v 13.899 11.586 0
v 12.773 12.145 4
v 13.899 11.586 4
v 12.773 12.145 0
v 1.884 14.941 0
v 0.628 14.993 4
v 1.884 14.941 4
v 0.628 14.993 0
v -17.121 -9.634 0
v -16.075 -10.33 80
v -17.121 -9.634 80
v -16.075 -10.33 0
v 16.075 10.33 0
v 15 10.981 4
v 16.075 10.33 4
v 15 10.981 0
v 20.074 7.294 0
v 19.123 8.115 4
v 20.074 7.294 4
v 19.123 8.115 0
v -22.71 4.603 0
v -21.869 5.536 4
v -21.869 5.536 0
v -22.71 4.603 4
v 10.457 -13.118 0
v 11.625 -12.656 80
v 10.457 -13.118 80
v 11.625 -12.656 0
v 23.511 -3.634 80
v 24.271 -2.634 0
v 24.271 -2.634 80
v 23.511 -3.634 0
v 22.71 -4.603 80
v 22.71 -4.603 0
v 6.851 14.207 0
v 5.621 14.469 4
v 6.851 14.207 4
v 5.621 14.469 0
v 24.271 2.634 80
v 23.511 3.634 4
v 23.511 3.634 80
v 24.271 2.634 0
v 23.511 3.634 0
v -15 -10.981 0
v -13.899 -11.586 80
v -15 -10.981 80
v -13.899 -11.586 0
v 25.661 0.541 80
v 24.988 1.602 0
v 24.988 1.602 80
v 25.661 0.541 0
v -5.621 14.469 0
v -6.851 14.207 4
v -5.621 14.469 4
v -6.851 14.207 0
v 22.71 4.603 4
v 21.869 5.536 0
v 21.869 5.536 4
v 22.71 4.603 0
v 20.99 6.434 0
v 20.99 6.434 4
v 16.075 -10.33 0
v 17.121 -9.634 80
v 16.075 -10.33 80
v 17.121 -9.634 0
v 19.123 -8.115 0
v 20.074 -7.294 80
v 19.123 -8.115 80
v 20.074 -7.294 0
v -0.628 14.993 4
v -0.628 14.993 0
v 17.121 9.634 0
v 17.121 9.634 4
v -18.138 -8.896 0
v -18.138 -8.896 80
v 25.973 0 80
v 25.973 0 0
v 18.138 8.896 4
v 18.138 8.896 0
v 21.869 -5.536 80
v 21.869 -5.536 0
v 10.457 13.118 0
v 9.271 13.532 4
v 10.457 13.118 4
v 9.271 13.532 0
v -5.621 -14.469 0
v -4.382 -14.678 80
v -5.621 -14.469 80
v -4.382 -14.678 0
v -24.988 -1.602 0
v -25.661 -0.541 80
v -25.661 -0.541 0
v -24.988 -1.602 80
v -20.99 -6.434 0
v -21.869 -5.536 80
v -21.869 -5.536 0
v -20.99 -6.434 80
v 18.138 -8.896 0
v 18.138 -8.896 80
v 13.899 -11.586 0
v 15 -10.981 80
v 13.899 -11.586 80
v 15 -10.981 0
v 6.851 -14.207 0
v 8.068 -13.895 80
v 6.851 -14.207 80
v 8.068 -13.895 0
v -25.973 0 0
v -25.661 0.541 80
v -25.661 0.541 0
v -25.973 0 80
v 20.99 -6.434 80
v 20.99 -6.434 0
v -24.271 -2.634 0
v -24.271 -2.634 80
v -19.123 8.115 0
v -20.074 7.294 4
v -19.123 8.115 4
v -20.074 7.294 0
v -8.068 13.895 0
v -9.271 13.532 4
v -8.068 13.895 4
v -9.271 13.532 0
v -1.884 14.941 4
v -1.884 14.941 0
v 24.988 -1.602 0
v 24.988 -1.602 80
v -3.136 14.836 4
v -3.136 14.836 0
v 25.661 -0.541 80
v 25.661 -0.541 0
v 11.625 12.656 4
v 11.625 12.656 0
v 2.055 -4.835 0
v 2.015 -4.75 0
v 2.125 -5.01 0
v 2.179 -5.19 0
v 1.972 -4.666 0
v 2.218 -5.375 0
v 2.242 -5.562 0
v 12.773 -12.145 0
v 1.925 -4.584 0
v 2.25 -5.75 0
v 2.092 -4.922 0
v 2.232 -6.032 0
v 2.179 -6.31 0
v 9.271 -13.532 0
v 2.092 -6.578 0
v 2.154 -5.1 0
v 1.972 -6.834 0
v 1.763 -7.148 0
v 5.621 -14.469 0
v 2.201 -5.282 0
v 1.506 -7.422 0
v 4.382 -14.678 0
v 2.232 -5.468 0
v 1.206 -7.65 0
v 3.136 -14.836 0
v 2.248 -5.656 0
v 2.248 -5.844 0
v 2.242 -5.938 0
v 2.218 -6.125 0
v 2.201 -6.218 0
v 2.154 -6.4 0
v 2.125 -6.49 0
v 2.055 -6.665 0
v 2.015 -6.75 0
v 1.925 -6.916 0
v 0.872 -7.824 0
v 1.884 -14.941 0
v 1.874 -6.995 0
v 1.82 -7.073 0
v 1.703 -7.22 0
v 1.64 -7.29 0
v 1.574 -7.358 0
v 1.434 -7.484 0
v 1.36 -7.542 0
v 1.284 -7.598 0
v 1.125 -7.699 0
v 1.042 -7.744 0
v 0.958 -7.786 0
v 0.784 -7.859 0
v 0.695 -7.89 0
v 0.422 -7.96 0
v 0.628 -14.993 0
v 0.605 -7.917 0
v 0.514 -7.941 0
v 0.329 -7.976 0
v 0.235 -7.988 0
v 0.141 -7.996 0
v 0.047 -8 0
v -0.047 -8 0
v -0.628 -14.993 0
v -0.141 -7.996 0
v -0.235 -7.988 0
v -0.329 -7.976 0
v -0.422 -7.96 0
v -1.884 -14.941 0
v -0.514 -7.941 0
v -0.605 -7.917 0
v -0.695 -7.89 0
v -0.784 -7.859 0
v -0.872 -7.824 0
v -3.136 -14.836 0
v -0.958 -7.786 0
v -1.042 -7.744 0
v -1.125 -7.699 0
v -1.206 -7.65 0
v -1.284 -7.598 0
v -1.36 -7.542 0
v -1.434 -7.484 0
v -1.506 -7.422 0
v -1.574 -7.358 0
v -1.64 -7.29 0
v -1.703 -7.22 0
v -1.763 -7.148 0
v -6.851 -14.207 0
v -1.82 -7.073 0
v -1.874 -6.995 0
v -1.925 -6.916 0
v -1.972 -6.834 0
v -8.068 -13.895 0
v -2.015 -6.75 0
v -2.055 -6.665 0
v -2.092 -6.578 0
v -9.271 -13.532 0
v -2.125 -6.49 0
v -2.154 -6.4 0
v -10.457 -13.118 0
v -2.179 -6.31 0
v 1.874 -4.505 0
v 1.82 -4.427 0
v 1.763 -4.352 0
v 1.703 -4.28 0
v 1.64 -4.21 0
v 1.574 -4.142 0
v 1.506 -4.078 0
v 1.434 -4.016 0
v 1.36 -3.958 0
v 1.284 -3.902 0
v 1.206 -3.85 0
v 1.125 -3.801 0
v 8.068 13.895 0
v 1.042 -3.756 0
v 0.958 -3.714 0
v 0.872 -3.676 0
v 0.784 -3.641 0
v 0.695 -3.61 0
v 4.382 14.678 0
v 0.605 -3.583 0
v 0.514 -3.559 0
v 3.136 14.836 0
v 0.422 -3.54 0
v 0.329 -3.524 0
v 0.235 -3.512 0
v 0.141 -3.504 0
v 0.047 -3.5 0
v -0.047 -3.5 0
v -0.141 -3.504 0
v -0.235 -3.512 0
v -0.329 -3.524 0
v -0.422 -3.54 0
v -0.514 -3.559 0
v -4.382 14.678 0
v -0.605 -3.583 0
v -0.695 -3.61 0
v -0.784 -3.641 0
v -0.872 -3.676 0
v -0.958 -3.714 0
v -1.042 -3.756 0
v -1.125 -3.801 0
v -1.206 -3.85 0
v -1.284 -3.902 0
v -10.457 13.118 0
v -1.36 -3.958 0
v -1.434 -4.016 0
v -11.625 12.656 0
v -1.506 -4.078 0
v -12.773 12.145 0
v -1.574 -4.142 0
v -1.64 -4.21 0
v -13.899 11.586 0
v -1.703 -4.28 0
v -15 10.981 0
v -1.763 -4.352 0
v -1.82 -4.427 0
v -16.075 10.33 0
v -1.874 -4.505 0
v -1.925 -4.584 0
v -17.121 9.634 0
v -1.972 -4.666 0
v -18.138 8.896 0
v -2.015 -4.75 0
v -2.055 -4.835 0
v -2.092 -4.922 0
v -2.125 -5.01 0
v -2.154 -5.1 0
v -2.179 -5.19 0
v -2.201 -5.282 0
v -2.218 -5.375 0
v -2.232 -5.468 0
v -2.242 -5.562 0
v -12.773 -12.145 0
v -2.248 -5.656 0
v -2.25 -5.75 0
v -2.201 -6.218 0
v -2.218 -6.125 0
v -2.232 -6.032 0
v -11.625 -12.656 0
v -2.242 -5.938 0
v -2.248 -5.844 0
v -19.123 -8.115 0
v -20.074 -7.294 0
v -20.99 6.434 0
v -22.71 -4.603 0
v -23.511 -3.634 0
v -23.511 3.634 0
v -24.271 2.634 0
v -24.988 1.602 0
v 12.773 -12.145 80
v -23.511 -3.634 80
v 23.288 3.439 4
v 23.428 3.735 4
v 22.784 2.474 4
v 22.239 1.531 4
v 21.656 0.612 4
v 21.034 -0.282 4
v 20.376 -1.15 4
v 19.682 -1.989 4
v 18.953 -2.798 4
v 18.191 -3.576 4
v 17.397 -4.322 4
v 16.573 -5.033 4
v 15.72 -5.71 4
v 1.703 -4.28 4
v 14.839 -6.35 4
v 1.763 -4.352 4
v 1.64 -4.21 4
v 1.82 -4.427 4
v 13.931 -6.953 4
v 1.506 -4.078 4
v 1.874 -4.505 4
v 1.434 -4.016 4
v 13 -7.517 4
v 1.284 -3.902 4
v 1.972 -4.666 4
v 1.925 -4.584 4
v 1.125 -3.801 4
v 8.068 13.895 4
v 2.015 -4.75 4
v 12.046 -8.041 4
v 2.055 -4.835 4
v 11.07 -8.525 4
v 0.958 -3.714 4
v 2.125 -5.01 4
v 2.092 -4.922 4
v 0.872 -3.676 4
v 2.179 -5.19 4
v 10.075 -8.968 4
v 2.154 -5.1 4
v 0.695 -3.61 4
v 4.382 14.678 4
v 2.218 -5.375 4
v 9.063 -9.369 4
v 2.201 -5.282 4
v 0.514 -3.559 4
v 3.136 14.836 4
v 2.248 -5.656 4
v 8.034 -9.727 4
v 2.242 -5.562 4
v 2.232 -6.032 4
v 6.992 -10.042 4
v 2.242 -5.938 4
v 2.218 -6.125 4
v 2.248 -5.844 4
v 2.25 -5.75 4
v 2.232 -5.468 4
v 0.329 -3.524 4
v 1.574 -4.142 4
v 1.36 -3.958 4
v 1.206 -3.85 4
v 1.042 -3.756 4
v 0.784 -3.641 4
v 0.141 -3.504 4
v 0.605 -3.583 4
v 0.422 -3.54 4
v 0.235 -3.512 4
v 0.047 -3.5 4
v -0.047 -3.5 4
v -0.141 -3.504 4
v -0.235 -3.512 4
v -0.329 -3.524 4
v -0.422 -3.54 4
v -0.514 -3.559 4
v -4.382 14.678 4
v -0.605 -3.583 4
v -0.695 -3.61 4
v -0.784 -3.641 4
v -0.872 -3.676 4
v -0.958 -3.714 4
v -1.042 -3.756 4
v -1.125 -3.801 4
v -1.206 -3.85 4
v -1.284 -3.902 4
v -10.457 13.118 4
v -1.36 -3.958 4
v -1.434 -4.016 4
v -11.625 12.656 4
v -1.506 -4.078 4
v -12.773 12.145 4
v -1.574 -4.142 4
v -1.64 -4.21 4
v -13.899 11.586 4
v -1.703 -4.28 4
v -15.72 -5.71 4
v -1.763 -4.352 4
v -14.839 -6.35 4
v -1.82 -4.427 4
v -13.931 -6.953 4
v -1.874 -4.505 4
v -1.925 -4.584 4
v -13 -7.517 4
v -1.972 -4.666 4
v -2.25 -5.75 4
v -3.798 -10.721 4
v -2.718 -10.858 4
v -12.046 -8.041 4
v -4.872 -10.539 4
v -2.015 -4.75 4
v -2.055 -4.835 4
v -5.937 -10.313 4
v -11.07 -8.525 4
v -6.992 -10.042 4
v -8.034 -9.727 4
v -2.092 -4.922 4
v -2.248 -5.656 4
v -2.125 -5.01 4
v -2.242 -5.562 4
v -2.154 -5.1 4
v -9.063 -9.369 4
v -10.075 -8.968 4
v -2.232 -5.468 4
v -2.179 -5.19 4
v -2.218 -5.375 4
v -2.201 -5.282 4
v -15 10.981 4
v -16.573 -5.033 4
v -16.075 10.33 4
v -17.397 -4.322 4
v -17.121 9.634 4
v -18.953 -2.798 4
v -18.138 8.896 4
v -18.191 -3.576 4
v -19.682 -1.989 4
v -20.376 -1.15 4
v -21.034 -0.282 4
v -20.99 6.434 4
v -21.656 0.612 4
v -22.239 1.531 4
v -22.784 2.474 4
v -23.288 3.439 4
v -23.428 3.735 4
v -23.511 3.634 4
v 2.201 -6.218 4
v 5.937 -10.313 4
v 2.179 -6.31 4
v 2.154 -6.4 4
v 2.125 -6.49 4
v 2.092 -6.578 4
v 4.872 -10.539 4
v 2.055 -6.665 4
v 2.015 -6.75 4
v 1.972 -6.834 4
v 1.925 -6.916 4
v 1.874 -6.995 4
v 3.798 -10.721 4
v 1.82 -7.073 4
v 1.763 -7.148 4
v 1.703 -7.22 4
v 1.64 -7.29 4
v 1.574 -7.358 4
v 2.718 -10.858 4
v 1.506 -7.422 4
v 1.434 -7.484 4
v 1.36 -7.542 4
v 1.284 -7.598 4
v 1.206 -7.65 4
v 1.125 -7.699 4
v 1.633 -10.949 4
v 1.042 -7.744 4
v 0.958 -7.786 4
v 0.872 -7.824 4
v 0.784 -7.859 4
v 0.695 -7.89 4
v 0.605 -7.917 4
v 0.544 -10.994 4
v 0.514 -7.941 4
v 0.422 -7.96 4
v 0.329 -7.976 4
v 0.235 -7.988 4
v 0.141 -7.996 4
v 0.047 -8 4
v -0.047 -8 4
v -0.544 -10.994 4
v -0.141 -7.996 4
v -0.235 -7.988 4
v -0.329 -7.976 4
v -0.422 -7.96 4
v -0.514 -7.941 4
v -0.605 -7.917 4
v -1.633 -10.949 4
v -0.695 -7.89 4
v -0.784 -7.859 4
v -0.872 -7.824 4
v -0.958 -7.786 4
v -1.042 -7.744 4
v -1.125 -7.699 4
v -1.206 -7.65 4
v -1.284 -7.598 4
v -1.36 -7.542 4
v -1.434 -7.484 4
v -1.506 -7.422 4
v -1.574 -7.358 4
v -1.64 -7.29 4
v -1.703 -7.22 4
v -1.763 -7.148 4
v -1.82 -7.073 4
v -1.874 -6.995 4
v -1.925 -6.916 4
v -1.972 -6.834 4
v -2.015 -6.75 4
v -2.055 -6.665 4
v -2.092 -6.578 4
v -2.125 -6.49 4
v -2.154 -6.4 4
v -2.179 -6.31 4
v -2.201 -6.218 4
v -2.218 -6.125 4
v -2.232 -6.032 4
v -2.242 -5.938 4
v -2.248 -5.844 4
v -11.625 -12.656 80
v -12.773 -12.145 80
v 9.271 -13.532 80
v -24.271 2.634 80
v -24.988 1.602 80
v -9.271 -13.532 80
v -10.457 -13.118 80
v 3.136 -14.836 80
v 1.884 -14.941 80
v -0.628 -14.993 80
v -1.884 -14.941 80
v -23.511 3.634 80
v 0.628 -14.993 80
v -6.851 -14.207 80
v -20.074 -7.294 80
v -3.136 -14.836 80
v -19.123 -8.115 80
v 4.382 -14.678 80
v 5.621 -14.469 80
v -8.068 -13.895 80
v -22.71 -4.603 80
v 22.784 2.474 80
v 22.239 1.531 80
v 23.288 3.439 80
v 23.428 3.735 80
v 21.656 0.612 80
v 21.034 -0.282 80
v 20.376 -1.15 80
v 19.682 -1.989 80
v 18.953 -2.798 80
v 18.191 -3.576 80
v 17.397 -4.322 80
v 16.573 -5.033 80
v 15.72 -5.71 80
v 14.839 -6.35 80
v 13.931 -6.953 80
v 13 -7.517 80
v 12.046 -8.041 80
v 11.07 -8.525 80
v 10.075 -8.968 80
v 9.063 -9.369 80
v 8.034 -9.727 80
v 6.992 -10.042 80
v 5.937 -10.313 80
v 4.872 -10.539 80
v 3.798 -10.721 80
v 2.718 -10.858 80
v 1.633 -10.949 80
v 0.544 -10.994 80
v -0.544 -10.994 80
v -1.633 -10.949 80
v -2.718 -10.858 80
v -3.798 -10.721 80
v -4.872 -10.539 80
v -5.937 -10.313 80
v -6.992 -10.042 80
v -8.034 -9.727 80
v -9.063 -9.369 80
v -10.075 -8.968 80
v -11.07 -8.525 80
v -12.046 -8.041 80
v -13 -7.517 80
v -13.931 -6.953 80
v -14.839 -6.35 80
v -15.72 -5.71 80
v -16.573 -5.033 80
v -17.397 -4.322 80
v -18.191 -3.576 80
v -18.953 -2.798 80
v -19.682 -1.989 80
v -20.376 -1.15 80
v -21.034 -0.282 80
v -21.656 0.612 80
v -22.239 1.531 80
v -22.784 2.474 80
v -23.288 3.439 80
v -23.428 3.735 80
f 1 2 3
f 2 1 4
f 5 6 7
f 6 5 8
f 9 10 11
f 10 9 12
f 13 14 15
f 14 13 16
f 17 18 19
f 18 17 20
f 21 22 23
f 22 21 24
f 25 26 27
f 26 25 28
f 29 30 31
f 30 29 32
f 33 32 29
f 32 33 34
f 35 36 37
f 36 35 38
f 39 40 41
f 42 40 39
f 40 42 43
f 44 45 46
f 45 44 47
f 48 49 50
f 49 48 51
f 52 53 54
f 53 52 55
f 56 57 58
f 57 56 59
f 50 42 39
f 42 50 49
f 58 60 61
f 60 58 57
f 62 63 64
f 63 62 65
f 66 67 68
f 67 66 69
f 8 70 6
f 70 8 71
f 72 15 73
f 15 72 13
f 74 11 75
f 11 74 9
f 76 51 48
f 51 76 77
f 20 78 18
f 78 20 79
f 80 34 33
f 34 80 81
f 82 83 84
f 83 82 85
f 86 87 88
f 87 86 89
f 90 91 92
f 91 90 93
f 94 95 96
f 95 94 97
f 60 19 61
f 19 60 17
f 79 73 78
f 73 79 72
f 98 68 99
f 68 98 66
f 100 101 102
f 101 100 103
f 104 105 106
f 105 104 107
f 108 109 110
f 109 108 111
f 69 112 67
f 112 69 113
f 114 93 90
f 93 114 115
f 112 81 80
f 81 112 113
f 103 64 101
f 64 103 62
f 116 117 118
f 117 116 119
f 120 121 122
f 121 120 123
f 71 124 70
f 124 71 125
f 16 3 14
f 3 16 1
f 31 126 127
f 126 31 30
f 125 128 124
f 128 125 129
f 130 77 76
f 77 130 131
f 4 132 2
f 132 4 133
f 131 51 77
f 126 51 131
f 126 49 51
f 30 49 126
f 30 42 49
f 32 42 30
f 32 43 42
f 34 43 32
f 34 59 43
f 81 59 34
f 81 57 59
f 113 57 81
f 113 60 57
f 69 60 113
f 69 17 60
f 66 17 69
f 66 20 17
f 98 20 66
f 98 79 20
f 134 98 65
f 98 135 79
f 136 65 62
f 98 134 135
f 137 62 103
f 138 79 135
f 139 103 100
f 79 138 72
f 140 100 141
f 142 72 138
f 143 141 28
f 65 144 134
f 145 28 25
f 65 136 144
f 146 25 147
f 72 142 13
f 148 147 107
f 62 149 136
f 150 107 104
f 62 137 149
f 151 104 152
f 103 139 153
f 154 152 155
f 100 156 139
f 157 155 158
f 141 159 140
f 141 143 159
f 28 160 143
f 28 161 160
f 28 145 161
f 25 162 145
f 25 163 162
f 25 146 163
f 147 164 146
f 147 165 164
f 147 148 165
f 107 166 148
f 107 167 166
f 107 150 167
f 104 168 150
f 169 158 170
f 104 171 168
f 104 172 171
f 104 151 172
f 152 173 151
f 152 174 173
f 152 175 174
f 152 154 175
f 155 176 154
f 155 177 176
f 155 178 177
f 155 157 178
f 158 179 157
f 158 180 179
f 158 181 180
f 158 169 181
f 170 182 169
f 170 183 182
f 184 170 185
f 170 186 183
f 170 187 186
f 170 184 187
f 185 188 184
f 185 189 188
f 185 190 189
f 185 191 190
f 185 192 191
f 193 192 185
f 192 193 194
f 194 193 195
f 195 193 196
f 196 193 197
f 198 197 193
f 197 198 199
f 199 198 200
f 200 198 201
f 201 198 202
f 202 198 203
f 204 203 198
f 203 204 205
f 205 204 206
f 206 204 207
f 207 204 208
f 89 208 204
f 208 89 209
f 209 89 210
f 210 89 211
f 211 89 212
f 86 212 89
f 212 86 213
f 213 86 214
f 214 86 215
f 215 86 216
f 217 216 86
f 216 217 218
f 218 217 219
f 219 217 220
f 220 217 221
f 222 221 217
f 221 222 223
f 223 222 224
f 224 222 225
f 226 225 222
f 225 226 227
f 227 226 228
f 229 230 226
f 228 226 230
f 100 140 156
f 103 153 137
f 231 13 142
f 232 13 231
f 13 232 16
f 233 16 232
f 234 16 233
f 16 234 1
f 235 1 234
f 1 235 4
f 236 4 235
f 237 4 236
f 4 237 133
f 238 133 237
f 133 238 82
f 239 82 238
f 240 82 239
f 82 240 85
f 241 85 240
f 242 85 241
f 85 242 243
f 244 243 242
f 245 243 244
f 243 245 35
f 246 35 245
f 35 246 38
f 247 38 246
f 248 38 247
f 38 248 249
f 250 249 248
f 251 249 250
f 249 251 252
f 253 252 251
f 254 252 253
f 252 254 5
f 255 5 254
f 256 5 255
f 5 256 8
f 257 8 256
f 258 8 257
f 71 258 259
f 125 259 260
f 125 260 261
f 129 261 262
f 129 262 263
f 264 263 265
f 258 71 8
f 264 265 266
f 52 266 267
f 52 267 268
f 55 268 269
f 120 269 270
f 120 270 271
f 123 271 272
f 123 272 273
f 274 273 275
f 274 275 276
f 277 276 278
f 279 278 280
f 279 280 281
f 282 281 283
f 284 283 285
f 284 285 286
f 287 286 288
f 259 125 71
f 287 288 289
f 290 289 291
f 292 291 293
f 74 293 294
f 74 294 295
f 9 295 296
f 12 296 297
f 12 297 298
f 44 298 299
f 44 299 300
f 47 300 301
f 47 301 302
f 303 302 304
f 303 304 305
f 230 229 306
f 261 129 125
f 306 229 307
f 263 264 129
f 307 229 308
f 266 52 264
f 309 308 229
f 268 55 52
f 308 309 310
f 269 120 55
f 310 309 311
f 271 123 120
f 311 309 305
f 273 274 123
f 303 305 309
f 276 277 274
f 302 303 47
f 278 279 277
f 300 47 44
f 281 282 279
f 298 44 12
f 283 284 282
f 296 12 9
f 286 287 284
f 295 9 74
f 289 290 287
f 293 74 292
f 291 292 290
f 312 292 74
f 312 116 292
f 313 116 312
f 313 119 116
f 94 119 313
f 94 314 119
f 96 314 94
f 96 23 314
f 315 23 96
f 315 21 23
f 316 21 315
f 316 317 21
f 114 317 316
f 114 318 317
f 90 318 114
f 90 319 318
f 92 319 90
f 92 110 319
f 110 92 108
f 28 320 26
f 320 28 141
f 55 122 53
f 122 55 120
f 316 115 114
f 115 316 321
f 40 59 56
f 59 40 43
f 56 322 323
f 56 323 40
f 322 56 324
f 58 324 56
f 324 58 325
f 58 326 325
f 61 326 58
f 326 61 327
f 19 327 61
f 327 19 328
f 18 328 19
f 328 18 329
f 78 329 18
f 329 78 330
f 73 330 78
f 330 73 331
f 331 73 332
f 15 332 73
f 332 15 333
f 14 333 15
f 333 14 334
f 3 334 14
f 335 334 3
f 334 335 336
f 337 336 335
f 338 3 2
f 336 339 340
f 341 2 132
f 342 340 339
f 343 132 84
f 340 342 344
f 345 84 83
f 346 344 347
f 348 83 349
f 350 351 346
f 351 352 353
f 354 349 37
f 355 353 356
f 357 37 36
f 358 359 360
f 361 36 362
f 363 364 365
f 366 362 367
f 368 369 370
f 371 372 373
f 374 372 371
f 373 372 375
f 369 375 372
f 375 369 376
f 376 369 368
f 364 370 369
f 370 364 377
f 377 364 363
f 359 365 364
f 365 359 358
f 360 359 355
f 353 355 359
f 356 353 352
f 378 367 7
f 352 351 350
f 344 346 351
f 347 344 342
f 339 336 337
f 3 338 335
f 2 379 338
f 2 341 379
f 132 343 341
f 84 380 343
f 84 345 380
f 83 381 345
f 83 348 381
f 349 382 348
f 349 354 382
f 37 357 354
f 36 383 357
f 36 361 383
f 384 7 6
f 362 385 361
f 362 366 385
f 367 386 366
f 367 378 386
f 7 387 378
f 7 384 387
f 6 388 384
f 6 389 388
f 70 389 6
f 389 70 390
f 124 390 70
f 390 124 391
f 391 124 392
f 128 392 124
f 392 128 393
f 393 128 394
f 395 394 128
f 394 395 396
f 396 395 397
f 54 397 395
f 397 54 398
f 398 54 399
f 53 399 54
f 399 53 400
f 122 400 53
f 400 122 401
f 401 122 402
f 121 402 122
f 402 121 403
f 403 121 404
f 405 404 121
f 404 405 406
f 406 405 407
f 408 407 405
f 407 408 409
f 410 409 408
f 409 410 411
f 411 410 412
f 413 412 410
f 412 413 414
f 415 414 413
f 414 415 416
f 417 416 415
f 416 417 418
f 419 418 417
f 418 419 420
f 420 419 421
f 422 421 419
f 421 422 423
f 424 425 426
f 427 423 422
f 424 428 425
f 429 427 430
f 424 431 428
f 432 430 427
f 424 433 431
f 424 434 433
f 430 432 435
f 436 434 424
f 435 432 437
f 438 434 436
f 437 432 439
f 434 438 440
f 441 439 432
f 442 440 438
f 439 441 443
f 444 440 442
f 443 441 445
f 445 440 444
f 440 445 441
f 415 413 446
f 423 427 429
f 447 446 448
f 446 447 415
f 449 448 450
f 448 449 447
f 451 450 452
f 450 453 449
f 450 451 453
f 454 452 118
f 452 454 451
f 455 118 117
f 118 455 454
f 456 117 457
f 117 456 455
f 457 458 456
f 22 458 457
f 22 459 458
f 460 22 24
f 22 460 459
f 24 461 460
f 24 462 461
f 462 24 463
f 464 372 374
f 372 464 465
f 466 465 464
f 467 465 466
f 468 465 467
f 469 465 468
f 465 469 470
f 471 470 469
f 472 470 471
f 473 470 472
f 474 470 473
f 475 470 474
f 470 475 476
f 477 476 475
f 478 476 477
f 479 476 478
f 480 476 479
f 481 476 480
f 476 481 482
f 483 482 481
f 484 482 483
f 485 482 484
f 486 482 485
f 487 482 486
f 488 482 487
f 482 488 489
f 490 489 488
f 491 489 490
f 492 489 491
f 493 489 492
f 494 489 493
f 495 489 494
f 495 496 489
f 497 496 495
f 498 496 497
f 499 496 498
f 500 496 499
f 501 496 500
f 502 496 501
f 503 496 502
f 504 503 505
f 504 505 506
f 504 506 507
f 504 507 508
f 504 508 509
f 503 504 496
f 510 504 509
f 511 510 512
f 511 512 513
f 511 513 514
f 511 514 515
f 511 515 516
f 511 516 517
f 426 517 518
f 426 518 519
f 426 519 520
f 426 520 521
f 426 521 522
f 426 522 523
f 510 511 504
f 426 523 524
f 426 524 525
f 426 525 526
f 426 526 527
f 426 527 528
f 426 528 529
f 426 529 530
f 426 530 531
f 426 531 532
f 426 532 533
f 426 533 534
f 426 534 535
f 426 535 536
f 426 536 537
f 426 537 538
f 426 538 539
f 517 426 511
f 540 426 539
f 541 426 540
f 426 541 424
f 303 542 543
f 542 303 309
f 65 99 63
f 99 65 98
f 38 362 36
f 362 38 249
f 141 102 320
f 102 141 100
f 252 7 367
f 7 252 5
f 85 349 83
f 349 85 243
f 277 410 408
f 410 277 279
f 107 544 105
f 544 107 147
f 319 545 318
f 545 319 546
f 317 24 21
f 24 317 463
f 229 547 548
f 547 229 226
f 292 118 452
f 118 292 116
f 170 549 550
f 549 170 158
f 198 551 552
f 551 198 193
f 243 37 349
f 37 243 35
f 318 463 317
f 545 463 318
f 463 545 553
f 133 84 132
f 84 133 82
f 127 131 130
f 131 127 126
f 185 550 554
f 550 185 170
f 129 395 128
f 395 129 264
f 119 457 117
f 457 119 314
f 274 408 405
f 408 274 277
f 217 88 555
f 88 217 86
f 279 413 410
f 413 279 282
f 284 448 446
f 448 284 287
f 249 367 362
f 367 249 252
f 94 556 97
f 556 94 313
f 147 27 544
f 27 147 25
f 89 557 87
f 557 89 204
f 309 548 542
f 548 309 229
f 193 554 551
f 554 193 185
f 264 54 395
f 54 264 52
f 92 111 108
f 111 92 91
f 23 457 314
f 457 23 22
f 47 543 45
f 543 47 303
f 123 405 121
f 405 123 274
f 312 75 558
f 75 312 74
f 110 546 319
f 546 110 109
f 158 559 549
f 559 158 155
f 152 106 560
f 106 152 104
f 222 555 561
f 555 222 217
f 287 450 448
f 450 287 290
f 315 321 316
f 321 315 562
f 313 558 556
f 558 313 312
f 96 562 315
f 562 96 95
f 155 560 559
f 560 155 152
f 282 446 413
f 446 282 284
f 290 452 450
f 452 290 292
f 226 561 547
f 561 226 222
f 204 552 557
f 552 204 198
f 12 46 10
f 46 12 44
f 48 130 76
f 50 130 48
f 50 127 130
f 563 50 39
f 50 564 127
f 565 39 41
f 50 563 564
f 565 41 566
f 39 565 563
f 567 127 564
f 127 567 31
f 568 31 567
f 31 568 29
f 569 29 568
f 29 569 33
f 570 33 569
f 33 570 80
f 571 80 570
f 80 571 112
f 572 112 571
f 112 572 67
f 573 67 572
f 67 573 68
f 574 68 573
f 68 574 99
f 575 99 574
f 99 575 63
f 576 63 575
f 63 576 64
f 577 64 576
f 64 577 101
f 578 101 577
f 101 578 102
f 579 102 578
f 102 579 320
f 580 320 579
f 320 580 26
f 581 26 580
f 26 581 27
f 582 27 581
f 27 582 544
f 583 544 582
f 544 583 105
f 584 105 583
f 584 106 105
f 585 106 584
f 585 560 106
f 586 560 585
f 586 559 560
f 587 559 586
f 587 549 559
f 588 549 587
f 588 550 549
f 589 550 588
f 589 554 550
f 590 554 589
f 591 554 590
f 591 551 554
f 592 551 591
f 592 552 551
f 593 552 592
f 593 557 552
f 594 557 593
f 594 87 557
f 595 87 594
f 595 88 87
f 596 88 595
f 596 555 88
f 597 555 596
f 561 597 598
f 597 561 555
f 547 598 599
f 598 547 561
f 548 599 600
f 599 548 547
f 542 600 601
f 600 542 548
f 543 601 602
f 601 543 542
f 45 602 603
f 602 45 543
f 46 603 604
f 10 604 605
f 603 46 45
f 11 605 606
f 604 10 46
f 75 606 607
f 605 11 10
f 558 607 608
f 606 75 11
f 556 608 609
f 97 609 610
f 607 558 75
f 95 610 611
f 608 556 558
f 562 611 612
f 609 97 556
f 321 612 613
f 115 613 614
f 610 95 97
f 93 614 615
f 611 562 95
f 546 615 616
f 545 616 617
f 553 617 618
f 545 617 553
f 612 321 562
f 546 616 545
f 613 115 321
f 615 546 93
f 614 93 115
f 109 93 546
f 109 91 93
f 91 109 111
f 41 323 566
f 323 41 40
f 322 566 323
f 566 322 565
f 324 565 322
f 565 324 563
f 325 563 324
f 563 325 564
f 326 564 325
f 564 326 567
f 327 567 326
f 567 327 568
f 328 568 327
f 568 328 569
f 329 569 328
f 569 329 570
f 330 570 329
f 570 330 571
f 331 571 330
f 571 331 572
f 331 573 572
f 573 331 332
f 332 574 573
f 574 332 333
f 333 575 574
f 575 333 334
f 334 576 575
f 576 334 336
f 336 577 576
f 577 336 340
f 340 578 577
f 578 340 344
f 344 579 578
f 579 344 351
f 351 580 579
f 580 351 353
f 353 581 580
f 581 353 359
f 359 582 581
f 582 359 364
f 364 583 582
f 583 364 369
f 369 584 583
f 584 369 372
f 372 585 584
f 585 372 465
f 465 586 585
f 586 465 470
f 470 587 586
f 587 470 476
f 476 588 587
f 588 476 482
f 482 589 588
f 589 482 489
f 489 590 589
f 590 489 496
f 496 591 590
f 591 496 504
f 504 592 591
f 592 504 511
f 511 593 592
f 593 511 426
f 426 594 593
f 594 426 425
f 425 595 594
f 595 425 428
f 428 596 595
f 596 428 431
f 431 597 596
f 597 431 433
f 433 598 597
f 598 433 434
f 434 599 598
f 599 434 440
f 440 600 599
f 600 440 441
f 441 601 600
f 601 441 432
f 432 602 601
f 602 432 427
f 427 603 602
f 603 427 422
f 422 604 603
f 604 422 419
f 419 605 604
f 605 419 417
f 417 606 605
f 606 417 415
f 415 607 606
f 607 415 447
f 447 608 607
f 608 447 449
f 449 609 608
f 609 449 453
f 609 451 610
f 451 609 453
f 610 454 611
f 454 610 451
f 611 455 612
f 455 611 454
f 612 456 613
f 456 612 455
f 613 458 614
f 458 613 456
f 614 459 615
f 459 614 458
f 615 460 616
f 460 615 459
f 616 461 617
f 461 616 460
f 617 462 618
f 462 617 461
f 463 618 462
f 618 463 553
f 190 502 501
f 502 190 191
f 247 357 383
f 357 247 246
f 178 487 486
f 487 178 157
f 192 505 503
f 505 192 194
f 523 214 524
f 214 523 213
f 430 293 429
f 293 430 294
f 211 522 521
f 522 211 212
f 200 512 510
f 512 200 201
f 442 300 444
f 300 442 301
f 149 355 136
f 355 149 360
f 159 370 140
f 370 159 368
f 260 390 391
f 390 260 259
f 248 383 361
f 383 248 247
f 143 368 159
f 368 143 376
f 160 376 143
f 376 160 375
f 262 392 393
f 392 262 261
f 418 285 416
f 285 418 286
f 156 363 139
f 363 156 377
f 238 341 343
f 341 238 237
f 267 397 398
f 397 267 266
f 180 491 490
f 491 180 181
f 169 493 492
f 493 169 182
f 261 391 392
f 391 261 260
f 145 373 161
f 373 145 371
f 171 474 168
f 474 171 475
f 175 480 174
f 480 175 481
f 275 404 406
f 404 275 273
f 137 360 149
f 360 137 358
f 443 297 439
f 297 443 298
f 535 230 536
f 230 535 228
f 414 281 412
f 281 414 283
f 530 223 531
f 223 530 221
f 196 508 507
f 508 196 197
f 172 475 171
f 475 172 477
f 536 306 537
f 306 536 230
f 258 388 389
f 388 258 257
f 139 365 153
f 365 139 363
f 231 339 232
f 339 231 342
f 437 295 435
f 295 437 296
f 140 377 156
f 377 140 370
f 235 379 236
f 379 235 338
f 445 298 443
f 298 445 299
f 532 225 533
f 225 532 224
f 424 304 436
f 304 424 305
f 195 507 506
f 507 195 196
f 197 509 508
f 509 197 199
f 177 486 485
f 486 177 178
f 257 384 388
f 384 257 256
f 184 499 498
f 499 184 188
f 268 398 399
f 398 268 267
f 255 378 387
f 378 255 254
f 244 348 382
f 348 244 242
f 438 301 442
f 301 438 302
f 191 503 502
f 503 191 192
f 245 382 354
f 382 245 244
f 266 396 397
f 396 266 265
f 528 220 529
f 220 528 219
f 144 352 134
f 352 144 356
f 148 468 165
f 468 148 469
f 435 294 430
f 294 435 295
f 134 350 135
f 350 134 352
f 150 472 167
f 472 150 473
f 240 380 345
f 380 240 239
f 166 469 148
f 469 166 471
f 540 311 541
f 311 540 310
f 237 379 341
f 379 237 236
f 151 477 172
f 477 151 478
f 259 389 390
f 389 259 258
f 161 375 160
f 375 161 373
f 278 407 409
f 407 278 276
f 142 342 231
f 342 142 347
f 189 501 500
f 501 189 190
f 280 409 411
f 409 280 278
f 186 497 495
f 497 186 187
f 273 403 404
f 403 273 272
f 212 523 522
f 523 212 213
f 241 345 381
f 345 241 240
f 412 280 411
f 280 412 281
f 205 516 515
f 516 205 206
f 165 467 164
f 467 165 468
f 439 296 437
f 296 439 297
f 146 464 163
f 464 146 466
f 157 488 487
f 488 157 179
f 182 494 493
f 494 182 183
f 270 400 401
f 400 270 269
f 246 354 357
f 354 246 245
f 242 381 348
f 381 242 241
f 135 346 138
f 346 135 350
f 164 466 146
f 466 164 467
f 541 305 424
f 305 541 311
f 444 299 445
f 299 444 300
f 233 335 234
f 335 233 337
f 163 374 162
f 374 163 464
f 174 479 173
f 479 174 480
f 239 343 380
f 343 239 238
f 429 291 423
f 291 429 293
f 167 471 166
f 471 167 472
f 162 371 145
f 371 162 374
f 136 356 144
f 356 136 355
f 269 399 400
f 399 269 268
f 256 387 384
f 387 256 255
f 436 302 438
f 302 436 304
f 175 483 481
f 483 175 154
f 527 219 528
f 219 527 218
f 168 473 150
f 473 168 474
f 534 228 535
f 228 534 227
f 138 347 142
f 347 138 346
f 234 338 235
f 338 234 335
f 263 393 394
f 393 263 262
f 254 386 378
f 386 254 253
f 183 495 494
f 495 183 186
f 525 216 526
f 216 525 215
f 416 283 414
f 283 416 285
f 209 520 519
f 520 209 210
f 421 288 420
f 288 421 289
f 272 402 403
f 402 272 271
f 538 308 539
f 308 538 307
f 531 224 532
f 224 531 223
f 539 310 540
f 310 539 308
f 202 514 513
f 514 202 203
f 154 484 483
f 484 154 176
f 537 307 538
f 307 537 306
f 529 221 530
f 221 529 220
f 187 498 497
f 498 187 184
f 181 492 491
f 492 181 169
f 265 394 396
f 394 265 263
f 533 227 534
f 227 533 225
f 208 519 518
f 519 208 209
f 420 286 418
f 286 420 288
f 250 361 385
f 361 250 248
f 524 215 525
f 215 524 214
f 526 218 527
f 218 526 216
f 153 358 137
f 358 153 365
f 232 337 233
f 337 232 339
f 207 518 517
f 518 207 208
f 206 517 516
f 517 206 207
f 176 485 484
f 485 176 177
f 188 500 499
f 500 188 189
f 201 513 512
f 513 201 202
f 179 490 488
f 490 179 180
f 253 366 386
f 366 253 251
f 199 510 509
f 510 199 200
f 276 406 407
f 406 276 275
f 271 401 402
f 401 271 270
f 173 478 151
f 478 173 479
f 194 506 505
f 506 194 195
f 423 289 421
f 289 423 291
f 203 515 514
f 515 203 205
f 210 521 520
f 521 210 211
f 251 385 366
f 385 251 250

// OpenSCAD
// Radius (and approximate width) of the hook.
hook_r = 60; // [30:80]
// Total length of the hook.
hook_l = 80; // [50:120]
// Thickness of the walls of the hook.
hook_t = 4; // [3.0:7.0]
// Diameter of the hole created for mounting with a screw.
hole_d = 4.5; // [3.0:6.0]
// Offset for the screw hole relative to the inner edge of the top face of the base.
hole_o = 3; // [2.0:6.0]

$fn = 150;

hook();

module base_shape()
intersection() {
  translate([0, hook_r / 4, 0])
    circle(d=hook_r);
  translate([0, hook_r / -4, 0])
    circle(d=hook_r);
}

module extrude_shape()
difference() {
  base_shape();

  translate([0, hook_r / 4])
    circle(d=hook_r - hook_t * 2);
}

module hook()
difference() {
  union() {
    linear_extrude(hook_t) base_shape();
    linear_extrude(hook_l) extrude_shape();
  }

  translate([0, hook_r / -4 + hook_t + hole_o + hole_d / 2, 0])
    cylinder(d=hole_d, h=hook_t);
}
